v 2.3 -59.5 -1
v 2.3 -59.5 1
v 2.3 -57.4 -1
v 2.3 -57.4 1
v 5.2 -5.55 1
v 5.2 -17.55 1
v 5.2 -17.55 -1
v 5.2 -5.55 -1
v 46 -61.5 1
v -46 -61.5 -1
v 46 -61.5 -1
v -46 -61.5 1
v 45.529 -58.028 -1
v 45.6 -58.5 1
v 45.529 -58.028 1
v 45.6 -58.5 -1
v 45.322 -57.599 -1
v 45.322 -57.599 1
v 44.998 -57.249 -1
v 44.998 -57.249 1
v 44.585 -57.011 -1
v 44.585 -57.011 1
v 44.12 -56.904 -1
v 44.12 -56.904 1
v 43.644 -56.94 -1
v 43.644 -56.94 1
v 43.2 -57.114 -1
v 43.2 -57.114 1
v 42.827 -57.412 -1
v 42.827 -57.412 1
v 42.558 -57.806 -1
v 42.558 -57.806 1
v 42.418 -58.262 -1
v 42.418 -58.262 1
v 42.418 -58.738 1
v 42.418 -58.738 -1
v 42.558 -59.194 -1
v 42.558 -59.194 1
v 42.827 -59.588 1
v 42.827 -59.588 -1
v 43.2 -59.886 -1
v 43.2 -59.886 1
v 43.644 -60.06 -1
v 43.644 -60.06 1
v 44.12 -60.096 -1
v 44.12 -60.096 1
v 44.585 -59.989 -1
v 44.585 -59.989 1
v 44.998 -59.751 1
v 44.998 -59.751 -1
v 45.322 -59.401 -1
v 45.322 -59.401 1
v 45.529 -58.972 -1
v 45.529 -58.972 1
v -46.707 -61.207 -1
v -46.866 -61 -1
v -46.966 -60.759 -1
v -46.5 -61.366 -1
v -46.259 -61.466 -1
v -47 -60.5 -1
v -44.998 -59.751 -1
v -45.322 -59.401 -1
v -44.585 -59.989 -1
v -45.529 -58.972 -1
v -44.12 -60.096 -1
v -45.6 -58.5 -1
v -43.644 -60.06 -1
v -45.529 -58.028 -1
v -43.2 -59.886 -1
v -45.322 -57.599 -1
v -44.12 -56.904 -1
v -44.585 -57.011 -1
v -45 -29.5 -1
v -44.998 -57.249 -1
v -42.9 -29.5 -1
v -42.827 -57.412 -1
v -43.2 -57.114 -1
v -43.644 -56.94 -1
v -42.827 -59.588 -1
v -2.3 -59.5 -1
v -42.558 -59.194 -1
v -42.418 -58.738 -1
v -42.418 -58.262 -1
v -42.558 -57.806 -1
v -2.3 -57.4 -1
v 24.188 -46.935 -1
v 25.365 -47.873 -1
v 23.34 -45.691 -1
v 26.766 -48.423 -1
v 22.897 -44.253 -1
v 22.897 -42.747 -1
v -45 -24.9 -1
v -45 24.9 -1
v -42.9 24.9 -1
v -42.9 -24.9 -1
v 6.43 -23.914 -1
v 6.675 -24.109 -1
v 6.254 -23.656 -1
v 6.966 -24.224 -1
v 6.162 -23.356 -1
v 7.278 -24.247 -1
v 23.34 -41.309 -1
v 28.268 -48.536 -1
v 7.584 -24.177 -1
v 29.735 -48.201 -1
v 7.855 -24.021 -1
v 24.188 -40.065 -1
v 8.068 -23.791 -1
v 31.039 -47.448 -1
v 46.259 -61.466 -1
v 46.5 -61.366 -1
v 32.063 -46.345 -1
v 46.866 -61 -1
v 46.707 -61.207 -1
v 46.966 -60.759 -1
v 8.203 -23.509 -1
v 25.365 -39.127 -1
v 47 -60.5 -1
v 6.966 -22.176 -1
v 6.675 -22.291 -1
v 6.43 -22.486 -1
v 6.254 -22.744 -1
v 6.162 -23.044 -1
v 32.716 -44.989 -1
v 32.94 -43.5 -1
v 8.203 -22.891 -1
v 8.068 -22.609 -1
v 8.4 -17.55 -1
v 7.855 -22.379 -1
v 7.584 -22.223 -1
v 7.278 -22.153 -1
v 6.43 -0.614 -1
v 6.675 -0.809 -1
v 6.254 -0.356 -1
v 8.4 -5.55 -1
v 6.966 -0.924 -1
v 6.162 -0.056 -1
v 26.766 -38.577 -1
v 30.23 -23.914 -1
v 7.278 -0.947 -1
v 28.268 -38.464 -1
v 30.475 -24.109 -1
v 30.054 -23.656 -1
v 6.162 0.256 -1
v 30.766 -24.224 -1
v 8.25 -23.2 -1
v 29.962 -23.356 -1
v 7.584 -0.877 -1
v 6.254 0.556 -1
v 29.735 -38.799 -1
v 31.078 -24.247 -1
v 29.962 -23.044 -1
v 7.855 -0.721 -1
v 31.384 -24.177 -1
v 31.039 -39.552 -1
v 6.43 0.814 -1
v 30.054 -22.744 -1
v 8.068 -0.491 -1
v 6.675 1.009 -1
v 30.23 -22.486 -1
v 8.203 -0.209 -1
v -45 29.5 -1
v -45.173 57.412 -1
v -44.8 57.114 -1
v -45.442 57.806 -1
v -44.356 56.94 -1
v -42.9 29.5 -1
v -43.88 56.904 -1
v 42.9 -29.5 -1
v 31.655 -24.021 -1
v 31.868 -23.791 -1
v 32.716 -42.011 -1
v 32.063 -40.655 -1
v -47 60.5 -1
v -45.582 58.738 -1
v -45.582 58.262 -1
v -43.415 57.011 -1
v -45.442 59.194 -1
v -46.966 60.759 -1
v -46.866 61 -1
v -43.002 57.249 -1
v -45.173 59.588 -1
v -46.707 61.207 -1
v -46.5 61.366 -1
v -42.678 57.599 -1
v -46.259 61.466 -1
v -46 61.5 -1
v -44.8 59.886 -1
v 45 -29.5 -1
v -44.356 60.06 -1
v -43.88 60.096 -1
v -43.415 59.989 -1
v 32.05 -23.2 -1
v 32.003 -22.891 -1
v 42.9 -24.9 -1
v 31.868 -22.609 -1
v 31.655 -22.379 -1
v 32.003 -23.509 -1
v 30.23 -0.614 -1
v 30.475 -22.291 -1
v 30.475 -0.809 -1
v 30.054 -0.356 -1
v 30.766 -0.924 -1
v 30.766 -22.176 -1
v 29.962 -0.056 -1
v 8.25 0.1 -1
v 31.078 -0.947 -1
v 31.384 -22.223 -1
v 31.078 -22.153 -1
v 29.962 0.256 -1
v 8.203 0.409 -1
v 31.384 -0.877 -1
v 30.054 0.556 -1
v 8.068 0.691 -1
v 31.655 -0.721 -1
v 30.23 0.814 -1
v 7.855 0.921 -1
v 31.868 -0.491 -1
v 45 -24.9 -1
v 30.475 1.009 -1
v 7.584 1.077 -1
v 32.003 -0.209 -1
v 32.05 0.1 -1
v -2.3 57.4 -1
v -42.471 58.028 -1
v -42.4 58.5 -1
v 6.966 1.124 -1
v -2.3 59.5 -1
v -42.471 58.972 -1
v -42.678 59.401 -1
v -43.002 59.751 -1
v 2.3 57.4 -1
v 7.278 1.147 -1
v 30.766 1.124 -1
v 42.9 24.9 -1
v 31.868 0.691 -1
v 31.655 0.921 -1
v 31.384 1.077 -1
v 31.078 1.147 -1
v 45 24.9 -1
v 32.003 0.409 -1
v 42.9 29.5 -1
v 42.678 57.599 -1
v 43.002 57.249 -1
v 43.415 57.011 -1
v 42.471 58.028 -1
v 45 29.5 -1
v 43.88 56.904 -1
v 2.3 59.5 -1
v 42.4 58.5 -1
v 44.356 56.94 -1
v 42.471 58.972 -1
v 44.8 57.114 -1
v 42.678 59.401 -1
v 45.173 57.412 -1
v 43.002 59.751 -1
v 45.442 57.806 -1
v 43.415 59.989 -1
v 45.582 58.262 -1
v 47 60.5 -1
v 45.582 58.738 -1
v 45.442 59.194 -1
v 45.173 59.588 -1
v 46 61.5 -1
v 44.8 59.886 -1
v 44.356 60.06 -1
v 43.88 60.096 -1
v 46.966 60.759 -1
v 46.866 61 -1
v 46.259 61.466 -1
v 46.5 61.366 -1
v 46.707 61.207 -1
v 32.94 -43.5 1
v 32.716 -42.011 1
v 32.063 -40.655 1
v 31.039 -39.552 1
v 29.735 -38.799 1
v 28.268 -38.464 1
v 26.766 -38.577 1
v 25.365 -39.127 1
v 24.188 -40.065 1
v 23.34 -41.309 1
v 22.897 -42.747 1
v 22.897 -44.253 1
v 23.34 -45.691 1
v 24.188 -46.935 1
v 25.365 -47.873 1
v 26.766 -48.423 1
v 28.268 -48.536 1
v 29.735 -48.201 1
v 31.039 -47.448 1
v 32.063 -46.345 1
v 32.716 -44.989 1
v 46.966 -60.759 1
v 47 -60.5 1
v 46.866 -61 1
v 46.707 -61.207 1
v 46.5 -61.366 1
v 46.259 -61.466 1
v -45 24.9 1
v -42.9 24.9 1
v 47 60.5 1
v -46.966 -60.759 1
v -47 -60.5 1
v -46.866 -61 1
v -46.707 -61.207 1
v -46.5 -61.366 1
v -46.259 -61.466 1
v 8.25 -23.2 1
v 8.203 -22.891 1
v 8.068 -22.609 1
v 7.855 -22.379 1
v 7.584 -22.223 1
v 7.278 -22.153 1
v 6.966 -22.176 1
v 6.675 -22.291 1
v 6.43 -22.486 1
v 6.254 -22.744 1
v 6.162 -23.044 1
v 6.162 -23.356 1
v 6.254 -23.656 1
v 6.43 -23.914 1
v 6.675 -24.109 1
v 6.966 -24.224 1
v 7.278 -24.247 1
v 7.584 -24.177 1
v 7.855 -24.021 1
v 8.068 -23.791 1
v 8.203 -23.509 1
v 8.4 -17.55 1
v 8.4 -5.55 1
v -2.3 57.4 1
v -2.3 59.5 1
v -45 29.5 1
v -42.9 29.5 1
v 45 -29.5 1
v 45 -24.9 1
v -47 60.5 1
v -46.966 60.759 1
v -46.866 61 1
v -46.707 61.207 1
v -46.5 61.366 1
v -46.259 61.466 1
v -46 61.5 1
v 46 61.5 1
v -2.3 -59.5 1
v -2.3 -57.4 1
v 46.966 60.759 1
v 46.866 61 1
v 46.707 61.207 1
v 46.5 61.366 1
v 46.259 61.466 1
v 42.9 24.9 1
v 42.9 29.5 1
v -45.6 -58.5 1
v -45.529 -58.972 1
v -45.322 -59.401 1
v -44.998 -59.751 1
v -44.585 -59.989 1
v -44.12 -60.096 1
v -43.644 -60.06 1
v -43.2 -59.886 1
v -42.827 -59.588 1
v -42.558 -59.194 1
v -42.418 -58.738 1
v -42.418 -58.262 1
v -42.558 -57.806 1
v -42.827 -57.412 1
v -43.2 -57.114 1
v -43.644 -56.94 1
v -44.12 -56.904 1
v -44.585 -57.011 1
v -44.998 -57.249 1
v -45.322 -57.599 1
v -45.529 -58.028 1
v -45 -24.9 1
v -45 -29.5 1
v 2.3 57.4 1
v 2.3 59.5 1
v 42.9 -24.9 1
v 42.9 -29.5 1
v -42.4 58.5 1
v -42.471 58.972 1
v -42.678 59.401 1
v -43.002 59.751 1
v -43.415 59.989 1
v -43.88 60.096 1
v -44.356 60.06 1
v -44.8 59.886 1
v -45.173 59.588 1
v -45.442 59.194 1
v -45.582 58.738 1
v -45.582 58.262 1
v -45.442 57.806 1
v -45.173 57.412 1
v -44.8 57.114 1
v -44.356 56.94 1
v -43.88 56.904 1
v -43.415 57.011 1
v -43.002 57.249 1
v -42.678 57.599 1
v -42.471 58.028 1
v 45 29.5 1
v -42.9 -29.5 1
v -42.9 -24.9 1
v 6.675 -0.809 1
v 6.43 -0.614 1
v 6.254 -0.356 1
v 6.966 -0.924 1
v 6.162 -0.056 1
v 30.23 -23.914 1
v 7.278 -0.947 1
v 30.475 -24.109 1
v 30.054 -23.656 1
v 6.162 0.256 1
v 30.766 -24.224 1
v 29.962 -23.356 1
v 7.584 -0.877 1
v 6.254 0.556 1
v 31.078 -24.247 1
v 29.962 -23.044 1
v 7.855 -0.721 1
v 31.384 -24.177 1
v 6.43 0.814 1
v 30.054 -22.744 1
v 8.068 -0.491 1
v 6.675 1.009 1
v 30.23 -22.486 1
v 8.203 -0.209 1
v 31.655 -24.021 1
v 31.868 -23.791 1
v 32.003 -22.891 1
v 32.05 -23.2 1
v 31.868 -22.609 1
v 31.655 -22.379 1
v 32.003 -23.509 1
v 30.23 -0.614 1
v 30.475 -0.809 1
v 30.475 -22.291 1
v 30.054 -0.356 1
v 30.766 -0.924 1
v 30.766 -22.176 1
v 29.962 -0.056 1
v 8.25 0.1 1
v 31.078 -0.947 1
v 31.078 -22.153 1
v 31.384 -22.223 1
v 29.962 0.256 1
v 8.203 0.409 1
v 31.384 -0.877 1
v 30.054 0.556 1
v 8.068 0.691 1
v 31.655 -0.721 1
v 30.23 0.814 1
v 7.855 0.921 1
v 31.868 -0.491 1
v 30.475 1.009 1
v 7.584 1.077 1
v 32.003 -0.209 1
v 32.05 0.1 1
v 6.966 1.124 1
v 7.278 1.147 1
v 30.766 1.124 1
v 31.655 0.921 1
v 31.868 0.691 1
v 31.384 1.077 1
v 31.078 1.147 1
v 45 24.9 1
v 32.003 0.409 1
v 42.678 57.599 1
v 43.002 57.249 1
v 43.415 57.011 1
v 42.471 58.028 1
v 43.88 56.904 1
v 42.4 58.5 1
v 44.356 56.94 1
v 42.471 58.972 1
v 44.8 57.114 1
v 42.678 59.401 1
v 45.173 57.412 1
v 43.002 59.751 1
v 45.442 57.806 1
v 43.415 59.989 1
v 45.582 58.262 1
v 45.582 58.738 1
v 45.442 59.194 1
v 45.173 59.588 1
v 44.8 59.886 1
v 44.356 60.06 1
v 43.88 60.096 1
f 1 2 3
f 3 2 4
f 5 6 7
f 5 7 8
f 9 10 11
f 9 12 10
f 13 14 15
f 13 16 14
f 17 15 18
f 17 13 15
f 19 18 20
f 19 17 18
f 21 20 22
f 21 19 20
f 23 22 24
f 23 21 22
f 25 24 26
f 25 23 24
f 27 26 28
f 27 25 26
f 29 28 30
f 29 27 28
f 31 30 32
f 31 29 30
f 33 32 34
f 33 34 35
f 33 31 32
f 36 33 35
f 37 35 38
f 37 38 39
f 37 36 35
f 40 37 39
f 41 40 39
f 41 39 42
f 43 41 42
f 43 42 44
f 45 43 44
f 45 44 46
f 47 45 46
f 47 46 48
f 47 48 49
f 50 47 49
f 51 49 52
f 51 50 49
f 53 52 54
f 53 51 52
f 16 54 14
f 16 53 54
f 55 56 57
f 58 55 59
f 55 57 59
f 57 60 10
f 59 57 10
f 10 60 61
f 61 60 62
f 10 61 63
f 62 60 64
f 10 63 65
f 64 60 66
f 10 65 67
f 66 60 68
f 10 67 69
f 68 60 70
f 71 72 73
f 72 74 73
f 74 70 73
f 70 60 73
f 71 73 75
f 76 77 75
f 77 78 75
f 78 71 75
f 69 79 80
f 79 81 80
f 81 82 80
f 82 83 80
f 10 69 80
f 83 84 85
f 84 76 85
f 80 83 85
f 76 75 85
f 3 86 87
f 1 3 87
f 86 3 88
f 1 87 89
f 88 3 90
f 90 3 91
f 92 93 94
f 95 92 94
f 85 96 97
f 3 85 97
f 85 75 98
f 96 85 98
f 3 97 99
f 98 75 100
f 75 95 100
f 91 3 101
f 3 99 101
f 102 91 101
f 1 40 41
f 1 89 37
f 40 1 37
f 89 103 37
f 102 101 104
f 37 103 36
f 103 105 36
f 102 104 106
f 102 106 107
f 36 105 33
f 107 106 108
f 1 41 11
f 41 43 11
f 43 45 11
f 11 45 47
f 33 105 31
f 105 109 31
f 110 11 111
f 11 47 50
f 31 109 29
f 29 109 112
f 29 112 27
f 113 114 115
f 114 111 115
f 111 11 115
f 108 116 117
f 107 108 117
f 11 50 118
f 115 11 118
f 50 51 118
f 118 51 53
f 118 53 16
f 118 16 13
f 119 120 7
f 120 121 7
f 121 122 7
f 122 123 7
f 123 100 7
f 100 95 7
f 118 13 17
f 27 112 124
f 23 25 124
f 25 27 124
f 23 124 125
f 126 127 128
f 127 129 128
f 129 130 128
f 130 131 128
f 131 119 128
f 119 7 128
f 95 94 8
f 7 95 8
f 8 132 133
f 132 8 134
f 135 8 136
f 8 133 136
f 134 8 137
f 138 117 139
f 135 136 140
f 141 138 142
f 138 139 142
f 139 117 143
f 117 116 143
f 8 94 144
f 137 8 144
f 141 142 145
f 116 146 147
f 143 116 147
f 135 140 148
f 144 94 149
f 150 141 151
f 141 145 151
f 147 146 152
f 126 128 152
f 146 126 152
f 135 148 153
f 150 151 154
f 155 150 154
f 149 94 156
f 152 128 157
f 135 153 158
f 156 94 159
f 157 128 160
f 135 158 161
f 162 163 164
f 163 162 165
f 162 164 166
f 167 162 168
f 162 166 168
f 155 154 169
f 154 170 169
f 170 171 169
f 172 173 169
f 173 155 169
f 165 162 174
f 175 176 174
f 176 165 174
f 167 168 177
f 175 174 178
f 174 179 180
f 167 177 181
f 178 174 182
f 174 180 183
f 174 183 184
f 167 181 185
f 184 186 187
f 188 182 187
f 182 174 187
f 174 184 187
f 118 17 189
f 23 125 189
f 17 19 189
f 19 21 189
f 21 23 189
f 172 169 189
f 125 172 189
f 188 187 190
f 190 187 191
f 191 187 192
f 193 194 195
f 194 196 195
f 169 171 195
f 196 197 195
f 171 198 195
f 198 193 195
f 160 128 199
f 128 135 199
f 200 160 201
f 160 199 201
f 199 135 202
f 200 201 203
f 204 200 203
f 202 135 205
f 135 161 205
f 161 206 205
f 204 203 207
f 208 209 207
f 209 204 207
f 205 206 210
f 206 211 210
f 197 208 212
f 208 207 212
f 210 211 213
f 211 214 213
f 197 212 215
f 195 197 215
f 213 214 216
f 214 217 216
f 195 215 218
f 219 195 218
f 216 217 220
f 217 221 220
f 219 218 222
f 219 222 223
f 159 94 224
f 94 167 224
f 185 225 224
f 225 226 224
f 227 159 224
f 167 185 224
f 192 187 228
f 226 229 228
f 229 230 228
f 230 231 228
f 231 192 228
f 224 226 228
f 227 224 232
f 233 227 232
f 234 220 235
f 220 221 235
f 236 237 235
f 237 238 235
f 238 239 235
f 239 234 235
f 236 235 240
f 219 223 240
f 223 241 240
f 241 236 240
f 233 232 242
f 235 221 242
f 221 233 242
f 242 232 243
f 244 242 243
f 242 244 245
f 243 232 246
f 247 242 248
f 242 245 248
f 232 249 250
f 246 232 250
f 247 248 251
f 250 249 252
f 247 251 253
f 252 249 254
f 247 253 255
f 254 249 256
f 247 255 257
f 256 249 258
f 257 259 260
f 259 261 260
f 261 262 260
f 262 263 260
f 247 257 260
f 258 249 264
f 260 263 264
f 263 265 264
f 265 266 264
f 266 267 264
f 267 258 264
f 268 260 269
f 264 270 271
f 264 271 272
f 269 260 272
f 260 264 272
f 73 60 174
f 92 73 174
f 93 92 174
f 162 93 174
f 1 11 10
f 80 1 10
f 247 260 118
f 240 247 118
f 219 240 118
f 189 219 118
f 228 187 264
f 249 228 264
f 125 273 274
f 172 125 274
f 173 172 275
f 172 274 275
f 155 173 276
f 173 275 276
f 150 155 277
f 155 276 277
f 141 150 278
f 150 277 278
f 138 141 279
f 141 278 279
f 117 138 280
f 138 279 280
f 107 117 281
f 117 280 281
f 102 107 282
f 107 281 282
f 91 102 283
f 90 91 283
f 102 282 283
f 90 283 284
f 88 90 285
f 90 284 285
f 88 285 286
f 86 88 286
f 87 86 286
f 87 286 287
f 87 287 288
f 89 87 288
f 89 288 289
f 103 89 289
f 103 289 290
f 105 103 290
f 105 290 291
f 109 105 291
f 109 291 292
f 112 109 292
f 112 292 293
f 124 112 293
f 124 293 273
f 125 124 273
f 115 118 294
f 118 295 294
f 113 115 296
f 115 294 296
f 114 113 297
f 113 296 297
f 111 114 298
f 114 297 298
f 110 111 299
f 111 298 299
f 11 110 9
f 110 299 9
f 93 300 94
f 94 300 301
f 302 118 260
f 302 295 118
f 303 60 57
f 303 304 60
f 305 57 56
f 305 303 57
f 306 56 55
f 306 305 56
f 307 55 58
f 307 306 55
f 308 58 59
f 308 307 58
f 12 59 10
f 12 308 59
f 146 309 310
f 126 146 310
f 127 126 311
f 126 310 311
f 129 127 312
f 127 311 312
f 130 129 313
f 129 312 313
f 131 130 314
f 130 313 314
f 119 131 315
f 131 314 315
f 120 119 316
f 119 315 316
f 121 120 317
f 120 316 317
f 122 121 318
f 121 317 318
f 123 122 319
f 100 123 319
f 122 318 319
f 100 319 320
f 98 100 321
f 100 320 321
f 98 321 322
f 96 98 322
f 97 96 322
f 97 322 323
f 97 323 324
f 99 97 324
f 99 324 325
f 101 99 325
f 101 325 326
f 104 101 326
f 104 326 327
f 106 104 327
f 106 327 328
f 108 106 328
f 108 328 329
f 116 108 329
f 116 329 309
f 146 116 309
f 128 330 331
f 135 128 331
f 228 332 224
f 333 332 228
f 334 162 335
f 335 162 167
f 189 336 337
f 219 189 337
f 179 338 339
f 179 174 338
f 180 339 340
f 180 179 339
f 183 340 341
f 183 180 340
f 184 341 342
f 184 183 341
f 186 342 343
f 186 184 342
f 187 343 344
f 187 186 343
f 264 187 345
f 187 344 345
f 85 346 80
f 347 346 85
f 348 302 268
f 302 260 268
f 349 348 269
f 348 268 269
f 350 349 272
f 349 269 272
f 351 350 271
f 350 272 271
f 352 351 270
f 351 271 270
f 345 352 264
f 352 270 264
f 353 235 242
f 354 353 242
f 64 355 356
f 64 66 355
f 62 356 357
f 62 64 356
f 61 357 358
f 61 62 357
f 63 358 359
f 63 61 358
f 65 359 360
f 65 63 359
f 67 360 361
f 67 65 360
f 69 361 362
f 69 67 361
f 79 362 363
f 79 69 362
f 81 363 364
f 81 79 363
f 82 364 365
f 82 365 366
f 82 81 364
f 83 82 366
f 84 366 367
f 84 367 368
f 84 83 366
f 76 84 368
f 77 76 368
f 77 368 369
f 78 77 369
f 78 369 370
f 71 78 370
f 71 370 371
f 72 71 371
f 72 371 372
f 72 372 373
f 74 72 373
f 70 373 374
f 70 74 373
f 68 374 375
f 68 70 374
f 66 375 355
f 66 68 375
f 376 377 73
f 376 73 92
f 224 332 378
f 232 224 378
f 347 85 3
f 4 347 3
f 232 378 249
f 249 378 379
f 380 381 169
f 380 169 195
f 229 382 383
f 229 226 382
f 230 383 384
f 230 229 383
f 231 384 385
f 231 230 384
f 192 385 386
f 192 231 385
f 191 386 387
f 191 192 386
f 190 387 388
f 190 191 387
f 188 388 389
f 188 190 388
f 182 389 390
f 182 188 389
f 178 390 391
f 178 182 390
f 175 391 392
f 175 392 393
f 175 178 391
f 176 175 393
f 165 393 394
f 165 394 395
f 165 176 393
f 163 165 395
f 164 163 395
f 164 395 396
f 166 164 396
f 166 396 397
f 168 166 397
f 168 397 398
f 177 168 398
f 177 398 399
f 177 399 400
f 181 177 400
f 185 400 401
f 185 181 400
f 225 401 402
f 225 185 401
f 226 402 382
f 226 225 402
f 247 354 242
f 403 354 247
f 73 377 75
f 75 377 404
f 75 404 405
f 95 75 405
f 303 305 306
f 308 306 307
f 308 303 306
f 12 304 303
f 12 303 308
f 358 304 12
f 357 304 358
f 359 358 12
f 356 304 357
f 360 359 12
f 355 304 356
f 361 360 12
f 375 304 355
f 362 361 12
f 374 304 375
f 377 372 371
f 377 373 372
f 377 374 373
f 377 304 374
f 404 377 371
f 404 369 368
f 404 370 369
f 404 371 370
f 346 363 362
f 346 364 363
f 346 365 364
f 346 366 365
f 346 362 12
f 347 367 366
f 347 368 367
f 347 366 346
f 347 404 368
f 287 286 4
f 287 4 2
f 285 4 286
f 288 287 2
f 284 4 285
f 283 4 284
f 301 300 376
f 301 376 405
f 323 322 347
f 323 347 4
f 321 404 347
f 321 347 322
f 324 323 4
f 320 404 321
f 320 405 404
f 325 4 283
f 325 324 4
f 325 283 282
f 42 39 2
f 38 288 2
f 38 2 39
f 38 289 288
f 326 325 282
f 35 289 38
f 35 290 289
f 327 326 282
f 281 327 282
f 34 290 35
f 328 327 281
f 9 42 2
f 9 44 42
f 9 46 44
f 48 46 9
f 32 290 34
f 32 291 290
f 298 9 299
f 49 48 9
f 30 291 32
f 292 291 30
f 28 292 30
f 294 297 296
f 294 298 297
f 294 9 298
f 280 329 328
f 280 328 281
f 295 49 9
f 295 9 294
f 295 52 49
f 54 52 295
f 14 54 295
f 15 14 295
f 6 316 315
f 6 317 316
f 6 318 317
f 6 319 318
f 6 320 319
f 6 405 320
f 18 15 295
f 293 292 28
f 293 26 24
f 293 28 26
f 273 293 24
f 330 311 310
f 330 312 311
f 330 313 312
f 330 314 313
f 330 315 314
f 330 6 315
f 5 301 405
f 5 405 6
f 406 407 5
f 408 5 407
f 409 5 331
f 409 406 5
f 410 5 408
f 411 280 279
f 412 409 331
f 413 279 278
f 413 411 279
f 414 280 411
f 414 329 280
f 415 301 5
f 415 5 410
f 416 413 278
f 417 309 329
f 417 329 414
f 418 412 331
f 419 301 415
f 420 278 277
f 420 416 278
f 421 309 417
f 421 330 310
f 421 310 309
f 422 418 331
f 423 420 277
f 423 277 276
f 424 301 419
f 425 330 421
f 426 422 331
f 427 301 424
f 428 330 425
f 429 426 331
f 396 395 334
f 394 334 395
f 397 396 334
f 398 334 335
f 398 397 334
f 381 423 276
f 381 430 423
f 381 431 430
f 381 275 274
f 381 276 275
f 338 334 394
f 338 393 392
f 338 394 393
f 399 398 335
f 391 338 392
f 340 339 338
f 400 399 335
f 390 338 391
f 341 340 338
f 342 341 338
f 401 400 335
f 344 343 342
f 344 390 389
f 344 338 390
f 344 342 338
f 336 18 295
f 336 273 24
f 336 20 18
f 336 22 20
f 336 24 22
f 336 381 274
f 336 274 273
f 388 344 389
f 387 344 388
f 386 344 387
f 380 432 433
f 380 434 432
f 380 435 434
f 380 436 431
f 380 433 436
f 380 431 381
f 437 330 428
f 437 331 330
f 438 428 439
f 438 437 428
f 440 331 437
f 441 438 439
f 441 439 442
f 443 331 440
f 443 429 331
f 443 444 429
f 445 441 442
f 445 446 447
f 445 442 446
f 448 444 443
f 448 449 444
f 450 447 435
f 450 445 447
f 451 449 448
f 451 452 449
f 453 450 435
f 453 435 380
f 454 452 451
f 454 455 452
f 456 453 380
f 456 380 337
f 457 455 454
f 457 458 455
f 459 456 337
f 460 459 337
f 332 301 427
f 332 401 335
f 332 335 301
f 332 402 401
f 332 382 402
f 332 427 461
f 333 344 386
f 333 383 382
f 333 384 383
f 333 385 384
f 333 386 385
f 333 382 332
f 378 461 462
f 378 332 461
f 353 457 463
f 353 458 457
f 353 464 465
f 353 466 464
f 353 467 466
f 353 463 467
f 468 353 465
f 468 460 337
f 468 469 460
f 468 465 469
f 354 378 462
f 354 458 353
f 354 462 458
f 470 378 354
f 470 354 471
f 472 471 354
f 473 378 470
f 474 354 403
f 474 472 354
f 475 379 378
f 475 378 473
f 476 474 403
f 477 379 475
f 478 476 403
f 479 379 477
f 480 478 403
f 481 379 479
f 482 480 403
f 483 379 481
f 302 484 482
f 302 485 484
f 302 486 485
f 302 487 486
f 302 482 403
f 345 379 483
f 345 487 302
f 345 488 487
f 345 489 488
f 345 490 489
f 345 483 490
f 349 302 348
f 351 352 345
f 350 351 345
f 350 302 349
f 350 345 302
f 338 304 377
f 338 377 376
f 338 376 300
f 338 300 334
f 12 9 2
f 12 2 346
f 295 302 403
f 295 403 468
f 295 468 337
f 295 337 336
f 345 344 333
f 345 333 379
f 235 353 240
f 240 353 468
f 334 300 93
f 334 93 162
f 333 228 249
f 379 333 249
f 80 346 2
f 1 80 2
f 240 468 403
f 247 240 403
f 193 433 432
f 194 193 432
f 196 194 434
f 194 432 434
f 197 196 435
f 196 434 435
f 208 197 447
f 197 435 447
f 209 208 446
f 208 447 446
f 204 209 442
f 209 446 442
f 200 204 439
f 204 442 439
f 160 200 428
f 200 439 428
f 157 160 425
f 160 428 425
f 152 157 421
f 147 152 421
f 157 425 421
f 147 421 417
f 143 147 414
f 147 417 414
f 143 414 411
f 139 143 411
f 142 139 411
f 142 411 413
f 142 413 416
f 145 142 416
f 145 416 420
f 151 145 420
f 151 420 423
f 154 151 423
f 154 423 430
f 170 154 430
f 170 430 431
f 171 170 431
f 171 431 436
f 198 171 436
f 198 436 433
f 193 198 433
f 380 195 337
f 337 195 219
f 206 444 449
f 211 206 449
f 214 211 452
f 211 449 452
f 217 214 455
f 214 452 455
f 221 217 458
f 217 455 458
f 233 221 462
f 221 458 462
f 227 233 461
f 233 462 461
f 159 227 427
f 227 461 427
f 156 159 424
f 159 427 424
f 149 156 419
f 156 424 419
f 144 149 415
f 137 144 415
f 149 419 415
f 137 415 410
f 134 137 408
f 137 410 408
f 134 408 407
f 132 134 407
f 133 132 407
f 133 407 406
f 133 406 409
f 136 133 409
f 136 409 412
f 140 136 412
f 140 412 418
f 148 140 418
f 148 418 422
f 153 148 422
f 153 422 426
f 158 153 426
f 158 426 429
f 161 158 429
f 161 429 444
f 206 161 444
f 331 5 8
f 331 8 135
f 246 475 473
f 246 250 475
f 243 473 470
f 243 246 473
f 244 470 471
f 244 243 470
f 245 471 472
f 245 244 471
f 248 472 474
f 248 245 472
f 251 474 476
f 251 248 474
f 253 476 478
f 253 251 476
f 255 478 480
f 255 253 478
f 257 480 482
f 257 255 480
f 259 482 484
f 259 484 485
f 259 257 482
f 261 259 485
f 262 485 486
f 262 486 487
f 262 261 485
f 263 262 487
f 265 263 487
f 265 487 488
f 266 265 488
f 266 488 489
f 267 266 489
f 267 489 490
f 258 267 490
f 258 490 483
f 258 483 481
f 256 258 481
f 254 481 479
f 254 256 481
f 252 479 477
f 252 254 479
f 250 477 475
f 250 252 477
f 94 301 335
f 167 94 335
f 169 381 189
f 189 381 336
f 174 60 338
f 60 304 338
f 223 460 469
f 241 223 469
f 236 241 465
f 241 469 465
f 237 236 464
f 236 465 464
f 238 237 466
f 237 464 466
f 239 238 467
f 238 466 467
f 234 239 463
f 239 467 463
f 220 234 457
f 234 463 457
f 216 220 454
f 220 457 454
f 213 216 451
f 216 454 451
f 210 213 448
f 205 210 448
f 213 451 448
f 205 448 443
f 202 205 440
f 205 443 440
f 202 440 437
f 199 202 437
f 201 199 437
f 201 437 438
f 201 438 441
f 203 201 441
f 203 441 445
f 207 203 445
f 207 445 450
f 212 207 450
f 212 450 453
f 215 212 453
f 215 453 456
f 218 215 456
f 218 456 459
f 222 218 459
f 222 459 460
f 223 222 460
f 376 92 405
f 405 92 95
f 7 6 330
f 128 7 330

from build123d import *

# Parameters (mm, degrees)
SKETCH1_W           = 94
SKETCH1_H           = 123
SKETCH1_R           = 1.6
SKETCH1_W_2         = 4.6
SKETCH1_H_2         = 2.1
SKETCH1_W_3         = 2.1
SKETCH1_H_3         = 4.6
BOSS_EXTRUDE1_DEPTH = 1
FILLET1_R           = 1
CUT_EXTRUDE1_REACH  = 79.429
SKETCH2_R           = 5.05
SKETCH2_R_2         = 1.05
SKETCH2_W           = 3.2
SKETCH2_H           = 12


with BuildPart() as part:
    # Sketch1 → Boss-Extrude1 (new, symmetric)
    with BuildSketch(Plane.XY):
        Rectangle(SKETCH1_W, SKETCH1_H)
        with Locations((-44, 58.5)):
            Circle(SKETCH1_R, mode=Mode.SUBTRACT)
        with Locations(Location((-44, -58.5, 0), (0, 0, 180))):
            Circle(SKETCH1_R, mode=Mode.SUBTRACT)
        with Locations((44, -58.5)):
            Circle(SKETCH1_R, mode=Mode.SUBTRACT)
        with Locations(Location((44, 58.5, 0), (0, 0, 180))):
            Circle(SKETCH1_R, mode=Mode.SUBTRACT)
        with Locations((0, -58.45)):
            Rectangle(SKETCH1_W_2, SKETCH1_H_2, mode=Mode.SUBTRACT)
        with Locations((0, 58.45)):
            Rectangle(SKETCH1_W_2, SKETCH1_H_2, mode=Mode.SUBTRACT)
        with Locations((-43.95, -27.2)):
            Rectangle(SKETCH1_W_3, SKETCH1_H_3, mode=Mode.SUBTRACT)
        with Locations((-43.95, 27.2)):
            Rectangle(SKETCH1_W_3, SKETCH1_H_3, mode=Mode.SUBTRACT)
        with Locations((43.95, -27.2)):
            Rectangle(SKETCH1_W_3, SKETCH1_H_3, mode=Mode.SUBTRACT)
        with Locations((43.95, 27.2)):
            Rectangle(SKETCH1_W_3, SKETCH1_H_3, mode=Mode.SUBTRACT)
    extrude(amount=BOSS_EXTRUDE1_DEPTH, both=True)

    # Fillet1
    fillet1_edges = [part.edges().sort_by_distance(p)[0] for p in [
        (47, -61.5, 0),
        (-47, -61.5, 0),
        (-47, 61.5, 0),
        (47, 61.5, 0),
    ]]
    fillet(fillet1_edges, radius=FILLET1_R)

    # Sketch2 → Cut-Extrude1 (cut, up to next)
    with BuildSketch(Plane.XY.offset(1), mode=Mode.PRIVATE) as cut_extrude1_sk1:
        with Locations((27.890121282, -43.5)):
            Circle(SKETCH2_R)
    cut_extrude1_tool1 = extrude(cut_extrude1_sk1.sketch, amount=-CUT_EXTRUDE1_REACH, mode=Mode.PRIVATE) & part.part
    # Sketch2 → Cut-Extrude1 (cut, up to next)
    with BuildSketch(Plane.XY.offset(1), mode=Mode.PRIVATE) as cut_extrude1_sk2:
        with Locations((7.2, -23.2)):
            Circle(SKETCH2_R_2)
    cut_extrude1_tool2 = extrude(cut_extrude1_sk2.sketch, amount=-CUT_EXTRUDE1_REACH, mode=Mode.PRIVATE) & part.part
    # Sketch2 → Cut-Extrude1 (cut, up to next)
    with BuildSketch(Plane.XY.offset(1), mode=Mode.PRIVATE) as cut_extrude1_sk3:
        with Locations((31, -23.2)):
            Circle(SKETCH2_R_2)
    cut_extrude1_tool3 = extrude(cut_extrude1_sk3.sketch, amount=-CUT_EXTRUDE1_REACH, mode=Mode.PRIVATE) & part.part
    # Sketch2 → Cut-Extrude1 (cut, up to next)
    with BuildSketch(Plane.XY.offset(1), mode=Mode.PRIVATE) as cut_extrude1_sk4:
        with Locations((31, 0.1)):
            Circle(SKETCH2_R_2)
    cut_extrude1_tool4 = extrude(cut_extrude1_sk4.sketch, amount=-CUT_EXTRUDE1_REACH, mode=Mode.PRIVATE) & part.part
    # Sketch2 → Cut-Extrude1 (cut, up to next)
    with BuildSketch(Plane.XY.offset(1), mode=Mode.PRIVATE) as cut_extrude1_sk5:
        with Locations((7.2, 0.1)):
            Circle(SKETCH2_R_2)
    cut_extrude1_tool5 = extrude(cut_extrude1_sk5.sketch, amount=-CUT_EXTRUDE1_REACH, mode=Mode.PRIVATE) & part.part
    # Sketch2 → Cut-Extrude1 (cut, up to next)
    with BuildSketch(Plane.XY.offset(1), mode=Mode.PRIVATE) as cut_extrude1_sk6:
        with Locations((6.8, -11.55)):
            Rectangle(SKETCH2_W, SKETCH2_H)
    cut_extrude1_tool6 = extrude(cut_extrude1_sk6.sketch, amount=-CUT_EXTRUDE1_REACH, mode=Mode.PRIVATE) & part.part
    add(cut_extrude1_tool1.solids().sort_by_distance((27.890121, -43.5, 1))[0], mode=Mode.SUBTRACT)
    add(cut_extrude1_tool2.solids().sort_by_distance((7.2, -23.2, 1))[0], mode=Mode.SUBTRACT)
    add(cut_extrude1_tool3.solids().sort_by_distance((31, -23.2, 1))[0], mode=Mode.SUBTRACT)
    add(cut_extrude1_tool4.solids().sort_by_distance((31, 0.1, 1))[0], mode=Mode.SUBTRACT)
    add(cut_extrude1_tool5.solids().sort_by_distance((7.2, 0.1, 1))[0], mode=Mode.SUBTRACT)
    add(cut_extrude1_tool6.solids().sort_by_distance((6.8, -11.55, 1))[0], mode=Mode.SUBTRACT)


solid = part.part
